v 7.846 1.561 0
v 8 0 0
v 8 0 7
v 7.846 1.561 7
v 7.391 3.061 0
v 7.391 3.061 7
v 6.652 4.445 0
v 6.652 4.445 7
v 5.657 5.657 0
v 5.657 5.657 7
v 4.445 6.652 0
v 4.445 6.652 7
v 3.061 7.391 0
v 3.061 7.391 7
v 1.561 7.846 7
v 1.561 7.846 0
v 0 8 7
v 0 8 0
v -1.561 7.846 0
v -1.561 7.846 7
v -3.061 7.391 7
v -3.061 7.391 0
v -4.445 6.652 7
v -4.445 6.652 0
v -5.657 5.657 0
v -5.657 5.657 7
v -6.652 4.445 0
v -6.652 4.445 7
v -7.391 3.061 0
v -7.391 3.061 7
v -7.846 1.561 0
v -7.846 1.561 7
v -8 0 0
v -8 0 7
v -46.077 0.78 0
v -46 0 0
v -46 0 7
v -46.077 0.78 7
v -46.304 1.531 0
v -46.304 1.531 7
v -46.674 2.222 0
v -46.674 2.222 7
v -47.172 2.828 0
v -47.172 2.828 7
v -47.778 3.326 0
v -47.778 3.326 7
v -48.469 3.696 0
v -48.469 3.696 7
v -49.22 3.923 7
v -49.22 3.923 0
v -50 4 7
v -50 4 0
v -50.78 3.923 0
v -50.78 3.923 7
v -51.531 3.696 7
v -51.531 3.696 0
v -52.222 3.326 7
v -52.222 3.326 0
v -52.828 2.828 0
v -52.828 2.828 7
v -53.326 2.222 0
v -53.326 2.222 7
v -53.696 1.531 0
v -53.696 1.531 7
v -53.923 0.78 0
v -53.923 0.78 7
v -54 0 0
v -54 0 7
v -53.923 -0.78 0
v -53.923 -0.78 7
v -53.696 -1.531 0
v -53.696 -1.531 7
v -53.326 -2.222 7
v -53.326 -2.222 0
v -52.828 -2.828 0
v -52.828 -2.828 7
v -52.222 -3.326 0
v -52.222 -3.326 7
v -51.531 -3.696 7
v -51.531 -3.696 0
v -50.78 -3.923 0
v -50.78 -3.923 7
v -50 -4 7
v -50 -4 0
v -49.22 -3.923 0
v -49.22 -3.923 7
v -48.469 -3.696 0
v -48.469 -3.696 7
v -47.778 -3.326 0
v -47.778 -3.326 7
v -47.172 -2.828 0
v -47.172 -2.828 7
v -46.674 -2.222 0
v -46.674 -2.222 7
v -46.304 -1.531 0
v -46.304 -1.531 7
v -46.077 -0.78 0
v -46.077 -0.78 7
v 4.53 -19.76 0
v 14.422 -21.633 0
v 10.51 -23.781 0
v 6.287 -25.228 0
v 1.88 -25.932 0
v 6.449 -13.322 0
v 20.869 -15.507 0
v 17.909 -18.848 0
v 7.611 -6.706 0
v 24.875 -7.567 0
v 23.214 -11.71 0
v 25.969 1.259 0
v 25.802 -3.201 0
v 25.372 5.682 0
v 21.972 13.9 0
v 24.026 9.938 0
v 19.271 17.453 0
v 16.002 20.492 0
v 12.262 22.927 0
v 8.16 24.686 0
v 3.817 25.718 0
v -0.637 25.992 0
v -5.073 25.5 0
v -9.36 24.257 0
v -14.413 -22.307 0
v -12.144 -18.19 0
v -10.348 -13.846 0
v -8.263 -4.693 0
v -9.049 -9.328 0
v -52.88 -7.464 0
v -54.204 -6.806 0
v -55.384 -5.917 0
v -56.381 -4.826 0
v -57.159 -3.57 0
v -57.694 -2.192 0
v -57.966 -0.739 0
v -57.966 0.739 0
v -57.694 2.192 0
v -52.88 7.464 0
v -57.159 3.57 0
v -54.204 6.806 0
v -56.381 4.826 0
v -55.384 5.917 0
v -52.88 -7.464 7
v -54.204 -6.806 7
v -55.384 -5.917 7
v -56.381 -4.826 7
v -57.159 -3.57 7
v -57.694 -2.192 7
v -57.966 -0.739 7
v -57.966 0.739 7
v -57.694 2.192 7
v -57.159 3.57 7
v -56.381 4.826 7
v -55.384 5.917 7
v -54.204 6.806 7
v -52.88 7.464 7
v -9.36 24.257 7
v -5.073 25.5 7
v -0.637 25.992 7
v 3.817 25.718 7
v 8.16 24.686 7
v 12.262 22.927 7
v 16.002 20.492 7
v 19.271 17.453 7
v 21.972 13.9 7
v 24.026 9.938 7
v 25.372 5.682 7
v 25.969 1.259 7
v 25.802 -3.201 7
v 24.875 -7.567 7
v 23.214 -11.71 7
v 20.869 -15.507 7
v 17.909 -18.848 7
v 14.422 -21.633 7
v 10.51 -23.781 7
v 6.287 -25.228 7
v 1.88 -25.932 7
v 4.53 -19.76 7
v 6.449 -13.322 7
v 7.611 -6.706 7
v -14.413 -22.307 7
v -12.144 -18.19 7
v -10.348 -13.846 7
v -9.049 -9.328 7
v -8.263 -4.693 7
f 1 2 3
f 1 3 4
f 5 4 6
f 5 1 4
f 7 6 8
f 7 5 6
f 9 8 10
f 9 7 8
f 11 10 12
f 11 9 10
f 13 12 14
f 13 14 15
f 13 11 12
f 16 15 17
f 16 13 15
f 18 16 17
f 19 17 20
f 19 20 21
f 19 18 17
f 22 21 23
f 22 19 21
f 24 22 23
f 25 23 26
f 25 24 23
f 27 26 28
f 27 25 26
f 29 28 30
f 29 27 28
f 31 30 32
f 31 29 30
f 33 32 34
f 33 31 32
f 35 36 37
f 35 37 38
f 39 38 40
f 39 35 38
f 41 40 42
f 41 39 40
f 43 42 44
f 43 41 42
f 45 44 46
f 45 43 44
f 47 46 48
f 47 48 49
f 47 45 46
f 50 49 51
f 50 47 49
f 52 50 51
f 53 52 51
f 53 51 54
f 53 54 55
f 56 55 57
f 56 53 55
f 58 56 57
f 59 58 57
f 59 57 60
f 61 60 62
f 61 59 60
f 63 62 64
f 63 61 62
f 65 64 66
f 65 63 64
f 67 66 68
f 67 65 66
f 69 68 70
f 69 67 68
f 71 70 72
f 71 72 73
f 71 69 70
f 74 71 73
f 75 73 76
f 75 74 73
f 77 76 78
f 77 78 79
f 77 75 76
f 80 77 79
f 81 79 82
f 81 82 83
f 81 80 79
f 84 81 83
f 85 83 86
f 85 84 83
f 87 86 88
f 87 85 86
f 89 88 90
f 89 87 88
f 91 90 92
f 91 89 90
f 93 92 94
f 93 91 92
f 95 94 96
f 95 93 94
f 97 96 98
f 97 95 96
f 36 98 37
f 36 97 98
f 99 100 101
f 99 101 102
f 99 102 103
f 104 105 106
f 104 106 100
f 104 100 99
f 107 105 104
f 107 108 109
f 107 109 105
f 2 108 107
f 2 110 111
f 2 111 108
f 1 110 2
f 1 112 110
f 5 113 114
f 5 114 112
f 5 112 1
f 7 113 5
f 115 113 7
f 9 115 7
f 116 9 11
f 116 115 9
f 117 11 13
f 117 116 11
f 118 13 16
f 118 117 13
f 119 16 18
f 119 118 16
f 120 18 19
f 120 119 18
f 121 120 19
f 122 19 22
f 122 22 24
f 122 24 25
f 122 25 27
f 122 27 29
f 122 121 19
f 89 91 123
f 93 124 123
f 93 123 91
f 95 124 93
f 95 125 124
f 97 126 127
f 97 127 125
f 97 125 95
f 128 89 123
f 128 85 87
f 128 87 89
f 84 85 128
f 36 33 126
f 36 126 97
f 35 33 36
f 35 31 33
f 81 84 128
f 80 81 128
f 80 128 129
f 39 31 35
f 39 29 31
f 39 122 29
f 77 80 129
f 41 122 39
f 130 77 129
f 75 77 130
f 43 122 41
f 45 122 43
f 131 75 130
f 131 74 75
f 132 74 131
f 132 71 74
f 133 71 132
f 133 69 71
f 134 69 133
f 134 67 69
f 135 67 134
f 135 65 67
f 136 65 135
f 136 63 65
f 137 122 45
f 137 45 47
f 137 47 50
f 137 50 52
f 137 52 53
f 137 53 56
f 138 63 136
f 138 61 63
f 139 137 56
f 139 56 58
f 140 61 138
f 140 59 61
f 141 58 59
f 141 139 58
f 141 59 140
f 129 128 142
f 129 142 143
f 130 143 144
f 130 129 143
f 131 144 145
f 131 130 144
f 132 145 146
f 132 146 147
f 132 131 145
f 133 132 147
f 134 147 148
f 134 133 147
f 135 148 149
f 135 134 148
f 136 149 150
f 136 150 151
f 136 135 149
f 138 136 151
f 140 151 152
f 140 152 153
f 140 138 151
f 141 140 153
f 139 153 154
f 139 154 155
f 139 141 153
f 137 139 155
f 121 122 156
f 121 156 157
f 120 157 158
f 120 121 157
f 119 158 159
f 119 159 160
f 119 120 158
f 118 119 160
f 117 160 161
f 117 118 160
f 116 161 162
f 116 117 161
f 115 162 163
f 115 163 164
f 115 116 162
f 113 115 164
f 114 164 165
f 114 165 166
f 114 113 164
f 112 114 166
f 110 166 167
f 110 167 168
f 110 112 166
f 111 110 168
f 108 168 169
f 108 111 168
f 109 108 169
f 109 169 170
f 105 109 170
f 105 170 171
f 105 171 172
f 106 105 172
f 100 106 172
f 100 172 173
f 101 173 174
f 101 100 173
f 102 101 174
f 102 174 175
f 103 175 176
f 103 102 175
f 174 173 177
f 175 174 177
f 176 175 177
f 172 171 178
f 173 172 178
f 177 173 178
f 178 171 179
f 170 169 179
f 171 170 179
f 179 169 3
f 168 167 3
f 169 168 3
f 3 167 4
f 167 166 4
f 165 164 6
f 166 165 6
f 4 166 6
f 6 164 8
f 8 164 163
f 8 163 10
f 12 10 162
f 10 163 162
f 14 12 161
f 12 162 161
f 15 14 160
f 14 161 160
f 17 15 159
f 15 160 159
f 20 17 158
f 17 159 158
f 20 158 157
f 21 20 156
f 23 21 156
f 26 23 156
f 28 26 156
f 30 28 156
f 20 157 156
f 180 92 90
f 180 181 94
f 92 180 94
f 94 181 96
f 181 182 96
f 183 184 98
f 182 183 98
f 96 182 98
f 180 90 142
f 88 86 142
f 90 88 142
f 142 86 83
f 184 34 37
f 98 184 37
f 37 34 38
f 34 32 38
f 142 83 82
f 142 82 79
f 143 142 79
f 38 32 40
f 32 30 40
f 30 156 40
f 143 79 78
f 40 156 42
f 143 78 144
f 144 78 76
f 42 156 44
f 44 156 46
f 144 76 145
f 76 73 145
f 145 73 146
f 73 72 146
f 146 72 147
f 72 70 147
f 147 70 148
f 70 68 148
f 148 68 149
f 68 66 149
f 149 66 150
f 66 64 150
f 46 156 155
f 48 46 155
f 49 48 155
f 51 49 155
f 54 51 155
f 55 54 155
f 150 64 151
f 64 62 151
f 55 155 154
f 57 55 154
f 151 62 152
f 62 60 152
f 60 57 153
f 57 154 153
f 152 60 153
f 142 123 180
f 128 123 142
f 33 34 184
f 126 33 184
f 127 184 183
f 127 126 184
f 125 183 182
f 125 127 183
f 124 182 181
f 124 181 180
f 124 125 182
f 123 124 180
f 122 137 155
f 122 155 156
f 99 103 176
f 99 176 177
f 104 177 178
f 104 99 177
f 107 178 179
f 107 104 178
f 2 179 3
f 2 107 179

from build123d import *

# Parameters (mm, degrees)
SKICA2_R                = 4
P_IDAT_VYSUNUT_M1_DEPTH = 7


with BuildPart() as part:
    # Skica2 → Přidat vysunutím1 (new body)
    with BuildSketch(Plane.XY):
        with BuildLine():
            Line((-52.88, 7.463618425), (-9.36, 24.256759883))
            ThreePointArc((-9.36, 24.256759883), (25.371520283, 5.682073435), (1.88, -25.931941694))
            ThreePointArc((1.88, -25.931941694), (6.44926926, -13.322161987), (8, 0))
            ThreePointArc((8, 0), (0, 8), (-8, 0))
            ThreePointArc((-8, 0), (-9.635178846, -11.60522353), (-14.413391103, -22.306798678))
            Line((-14.413391103, -22.306798678), (-52.88, -7.463618425))
            ThreePointArc((-52.88, -7.463618425), (-58, 0), (-52.88, 7.463618425))
        make_face()
        with Locations((-50, 0)):
            Circle(SKICA2_R, mode=Mode.SUBTRACT)
    extrude(amount=P_IDAT_VYSUNUT_M1_DEPTH)


solid = part.part
